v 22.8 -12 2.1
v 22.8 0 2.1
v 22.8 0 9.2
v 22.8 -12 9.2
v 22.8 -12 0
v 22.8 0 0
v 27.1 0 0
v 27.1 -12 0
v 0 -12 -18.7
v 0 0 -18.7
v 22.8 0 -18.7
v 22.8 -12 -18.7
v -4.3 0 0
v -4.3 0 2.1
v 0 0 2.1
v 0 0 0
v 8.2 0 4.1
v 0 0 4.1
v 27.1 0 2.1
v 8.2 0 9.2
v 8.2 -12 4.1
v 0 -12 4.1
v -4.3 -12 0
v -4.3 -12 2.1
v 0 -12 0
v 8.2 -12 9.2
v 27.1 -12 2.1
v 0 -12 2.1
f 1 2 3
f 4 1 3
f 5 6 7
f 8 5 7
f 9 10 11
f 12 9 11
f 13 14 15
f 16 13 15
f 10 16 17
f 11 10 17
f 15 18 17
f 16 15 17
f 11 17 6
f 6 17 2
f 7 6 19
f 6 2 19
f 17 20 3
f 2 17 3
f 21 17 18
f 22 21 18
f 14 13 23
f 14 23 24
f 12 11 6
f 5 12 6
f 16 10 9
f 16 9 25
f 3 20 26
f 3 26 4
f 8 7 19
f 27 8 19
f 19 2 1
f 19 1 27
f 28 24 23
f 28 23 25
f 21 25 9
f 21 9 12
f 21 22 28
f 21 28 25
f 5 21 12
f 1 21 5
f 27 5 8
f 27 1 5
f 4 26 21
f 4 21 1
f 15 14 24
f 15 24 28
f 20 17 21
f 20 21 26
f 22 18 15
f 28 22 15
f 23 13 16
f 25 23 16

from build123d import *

# Parameters (mm, degrees)
F0_W     = 22.8
F0_H     = 18.7
F0_W_2   = 4.3
F0_H_2   = 2.1
F0_W_3   = 14.6
F0_H_3   = 5.1
F1_DEPTH = 12


with BuildPart() as f1:
    # F0 (on Front) → F1 (new body)
    with BuildSketch(Plane.XZ):
        with Locations((11.4, -9.35)):
            Rectangle(F0_W, F0_H)
        with Locations((-2.15, 1.05)):
            Rectangle(F0_W_2, F0_H_2)
        Polygon((8.2, 4.1), (0, 4.1), (0, 2.1), (22.8, 2.1), (22.8, 4.1), align=None)
        with Locations((11.4, 1.05)):
            Rectangle(F0_W, F0_H_2)
        with Locations((15.5, 6.65)):
            Rectangle(F0_W_3, F0_H_3)
        with Locations((24.95, 1.05)):
            Rectangle(F0_W_2, F0_H_2)
    extrude(amount=F1_DEPTH)


solid = f1.part
